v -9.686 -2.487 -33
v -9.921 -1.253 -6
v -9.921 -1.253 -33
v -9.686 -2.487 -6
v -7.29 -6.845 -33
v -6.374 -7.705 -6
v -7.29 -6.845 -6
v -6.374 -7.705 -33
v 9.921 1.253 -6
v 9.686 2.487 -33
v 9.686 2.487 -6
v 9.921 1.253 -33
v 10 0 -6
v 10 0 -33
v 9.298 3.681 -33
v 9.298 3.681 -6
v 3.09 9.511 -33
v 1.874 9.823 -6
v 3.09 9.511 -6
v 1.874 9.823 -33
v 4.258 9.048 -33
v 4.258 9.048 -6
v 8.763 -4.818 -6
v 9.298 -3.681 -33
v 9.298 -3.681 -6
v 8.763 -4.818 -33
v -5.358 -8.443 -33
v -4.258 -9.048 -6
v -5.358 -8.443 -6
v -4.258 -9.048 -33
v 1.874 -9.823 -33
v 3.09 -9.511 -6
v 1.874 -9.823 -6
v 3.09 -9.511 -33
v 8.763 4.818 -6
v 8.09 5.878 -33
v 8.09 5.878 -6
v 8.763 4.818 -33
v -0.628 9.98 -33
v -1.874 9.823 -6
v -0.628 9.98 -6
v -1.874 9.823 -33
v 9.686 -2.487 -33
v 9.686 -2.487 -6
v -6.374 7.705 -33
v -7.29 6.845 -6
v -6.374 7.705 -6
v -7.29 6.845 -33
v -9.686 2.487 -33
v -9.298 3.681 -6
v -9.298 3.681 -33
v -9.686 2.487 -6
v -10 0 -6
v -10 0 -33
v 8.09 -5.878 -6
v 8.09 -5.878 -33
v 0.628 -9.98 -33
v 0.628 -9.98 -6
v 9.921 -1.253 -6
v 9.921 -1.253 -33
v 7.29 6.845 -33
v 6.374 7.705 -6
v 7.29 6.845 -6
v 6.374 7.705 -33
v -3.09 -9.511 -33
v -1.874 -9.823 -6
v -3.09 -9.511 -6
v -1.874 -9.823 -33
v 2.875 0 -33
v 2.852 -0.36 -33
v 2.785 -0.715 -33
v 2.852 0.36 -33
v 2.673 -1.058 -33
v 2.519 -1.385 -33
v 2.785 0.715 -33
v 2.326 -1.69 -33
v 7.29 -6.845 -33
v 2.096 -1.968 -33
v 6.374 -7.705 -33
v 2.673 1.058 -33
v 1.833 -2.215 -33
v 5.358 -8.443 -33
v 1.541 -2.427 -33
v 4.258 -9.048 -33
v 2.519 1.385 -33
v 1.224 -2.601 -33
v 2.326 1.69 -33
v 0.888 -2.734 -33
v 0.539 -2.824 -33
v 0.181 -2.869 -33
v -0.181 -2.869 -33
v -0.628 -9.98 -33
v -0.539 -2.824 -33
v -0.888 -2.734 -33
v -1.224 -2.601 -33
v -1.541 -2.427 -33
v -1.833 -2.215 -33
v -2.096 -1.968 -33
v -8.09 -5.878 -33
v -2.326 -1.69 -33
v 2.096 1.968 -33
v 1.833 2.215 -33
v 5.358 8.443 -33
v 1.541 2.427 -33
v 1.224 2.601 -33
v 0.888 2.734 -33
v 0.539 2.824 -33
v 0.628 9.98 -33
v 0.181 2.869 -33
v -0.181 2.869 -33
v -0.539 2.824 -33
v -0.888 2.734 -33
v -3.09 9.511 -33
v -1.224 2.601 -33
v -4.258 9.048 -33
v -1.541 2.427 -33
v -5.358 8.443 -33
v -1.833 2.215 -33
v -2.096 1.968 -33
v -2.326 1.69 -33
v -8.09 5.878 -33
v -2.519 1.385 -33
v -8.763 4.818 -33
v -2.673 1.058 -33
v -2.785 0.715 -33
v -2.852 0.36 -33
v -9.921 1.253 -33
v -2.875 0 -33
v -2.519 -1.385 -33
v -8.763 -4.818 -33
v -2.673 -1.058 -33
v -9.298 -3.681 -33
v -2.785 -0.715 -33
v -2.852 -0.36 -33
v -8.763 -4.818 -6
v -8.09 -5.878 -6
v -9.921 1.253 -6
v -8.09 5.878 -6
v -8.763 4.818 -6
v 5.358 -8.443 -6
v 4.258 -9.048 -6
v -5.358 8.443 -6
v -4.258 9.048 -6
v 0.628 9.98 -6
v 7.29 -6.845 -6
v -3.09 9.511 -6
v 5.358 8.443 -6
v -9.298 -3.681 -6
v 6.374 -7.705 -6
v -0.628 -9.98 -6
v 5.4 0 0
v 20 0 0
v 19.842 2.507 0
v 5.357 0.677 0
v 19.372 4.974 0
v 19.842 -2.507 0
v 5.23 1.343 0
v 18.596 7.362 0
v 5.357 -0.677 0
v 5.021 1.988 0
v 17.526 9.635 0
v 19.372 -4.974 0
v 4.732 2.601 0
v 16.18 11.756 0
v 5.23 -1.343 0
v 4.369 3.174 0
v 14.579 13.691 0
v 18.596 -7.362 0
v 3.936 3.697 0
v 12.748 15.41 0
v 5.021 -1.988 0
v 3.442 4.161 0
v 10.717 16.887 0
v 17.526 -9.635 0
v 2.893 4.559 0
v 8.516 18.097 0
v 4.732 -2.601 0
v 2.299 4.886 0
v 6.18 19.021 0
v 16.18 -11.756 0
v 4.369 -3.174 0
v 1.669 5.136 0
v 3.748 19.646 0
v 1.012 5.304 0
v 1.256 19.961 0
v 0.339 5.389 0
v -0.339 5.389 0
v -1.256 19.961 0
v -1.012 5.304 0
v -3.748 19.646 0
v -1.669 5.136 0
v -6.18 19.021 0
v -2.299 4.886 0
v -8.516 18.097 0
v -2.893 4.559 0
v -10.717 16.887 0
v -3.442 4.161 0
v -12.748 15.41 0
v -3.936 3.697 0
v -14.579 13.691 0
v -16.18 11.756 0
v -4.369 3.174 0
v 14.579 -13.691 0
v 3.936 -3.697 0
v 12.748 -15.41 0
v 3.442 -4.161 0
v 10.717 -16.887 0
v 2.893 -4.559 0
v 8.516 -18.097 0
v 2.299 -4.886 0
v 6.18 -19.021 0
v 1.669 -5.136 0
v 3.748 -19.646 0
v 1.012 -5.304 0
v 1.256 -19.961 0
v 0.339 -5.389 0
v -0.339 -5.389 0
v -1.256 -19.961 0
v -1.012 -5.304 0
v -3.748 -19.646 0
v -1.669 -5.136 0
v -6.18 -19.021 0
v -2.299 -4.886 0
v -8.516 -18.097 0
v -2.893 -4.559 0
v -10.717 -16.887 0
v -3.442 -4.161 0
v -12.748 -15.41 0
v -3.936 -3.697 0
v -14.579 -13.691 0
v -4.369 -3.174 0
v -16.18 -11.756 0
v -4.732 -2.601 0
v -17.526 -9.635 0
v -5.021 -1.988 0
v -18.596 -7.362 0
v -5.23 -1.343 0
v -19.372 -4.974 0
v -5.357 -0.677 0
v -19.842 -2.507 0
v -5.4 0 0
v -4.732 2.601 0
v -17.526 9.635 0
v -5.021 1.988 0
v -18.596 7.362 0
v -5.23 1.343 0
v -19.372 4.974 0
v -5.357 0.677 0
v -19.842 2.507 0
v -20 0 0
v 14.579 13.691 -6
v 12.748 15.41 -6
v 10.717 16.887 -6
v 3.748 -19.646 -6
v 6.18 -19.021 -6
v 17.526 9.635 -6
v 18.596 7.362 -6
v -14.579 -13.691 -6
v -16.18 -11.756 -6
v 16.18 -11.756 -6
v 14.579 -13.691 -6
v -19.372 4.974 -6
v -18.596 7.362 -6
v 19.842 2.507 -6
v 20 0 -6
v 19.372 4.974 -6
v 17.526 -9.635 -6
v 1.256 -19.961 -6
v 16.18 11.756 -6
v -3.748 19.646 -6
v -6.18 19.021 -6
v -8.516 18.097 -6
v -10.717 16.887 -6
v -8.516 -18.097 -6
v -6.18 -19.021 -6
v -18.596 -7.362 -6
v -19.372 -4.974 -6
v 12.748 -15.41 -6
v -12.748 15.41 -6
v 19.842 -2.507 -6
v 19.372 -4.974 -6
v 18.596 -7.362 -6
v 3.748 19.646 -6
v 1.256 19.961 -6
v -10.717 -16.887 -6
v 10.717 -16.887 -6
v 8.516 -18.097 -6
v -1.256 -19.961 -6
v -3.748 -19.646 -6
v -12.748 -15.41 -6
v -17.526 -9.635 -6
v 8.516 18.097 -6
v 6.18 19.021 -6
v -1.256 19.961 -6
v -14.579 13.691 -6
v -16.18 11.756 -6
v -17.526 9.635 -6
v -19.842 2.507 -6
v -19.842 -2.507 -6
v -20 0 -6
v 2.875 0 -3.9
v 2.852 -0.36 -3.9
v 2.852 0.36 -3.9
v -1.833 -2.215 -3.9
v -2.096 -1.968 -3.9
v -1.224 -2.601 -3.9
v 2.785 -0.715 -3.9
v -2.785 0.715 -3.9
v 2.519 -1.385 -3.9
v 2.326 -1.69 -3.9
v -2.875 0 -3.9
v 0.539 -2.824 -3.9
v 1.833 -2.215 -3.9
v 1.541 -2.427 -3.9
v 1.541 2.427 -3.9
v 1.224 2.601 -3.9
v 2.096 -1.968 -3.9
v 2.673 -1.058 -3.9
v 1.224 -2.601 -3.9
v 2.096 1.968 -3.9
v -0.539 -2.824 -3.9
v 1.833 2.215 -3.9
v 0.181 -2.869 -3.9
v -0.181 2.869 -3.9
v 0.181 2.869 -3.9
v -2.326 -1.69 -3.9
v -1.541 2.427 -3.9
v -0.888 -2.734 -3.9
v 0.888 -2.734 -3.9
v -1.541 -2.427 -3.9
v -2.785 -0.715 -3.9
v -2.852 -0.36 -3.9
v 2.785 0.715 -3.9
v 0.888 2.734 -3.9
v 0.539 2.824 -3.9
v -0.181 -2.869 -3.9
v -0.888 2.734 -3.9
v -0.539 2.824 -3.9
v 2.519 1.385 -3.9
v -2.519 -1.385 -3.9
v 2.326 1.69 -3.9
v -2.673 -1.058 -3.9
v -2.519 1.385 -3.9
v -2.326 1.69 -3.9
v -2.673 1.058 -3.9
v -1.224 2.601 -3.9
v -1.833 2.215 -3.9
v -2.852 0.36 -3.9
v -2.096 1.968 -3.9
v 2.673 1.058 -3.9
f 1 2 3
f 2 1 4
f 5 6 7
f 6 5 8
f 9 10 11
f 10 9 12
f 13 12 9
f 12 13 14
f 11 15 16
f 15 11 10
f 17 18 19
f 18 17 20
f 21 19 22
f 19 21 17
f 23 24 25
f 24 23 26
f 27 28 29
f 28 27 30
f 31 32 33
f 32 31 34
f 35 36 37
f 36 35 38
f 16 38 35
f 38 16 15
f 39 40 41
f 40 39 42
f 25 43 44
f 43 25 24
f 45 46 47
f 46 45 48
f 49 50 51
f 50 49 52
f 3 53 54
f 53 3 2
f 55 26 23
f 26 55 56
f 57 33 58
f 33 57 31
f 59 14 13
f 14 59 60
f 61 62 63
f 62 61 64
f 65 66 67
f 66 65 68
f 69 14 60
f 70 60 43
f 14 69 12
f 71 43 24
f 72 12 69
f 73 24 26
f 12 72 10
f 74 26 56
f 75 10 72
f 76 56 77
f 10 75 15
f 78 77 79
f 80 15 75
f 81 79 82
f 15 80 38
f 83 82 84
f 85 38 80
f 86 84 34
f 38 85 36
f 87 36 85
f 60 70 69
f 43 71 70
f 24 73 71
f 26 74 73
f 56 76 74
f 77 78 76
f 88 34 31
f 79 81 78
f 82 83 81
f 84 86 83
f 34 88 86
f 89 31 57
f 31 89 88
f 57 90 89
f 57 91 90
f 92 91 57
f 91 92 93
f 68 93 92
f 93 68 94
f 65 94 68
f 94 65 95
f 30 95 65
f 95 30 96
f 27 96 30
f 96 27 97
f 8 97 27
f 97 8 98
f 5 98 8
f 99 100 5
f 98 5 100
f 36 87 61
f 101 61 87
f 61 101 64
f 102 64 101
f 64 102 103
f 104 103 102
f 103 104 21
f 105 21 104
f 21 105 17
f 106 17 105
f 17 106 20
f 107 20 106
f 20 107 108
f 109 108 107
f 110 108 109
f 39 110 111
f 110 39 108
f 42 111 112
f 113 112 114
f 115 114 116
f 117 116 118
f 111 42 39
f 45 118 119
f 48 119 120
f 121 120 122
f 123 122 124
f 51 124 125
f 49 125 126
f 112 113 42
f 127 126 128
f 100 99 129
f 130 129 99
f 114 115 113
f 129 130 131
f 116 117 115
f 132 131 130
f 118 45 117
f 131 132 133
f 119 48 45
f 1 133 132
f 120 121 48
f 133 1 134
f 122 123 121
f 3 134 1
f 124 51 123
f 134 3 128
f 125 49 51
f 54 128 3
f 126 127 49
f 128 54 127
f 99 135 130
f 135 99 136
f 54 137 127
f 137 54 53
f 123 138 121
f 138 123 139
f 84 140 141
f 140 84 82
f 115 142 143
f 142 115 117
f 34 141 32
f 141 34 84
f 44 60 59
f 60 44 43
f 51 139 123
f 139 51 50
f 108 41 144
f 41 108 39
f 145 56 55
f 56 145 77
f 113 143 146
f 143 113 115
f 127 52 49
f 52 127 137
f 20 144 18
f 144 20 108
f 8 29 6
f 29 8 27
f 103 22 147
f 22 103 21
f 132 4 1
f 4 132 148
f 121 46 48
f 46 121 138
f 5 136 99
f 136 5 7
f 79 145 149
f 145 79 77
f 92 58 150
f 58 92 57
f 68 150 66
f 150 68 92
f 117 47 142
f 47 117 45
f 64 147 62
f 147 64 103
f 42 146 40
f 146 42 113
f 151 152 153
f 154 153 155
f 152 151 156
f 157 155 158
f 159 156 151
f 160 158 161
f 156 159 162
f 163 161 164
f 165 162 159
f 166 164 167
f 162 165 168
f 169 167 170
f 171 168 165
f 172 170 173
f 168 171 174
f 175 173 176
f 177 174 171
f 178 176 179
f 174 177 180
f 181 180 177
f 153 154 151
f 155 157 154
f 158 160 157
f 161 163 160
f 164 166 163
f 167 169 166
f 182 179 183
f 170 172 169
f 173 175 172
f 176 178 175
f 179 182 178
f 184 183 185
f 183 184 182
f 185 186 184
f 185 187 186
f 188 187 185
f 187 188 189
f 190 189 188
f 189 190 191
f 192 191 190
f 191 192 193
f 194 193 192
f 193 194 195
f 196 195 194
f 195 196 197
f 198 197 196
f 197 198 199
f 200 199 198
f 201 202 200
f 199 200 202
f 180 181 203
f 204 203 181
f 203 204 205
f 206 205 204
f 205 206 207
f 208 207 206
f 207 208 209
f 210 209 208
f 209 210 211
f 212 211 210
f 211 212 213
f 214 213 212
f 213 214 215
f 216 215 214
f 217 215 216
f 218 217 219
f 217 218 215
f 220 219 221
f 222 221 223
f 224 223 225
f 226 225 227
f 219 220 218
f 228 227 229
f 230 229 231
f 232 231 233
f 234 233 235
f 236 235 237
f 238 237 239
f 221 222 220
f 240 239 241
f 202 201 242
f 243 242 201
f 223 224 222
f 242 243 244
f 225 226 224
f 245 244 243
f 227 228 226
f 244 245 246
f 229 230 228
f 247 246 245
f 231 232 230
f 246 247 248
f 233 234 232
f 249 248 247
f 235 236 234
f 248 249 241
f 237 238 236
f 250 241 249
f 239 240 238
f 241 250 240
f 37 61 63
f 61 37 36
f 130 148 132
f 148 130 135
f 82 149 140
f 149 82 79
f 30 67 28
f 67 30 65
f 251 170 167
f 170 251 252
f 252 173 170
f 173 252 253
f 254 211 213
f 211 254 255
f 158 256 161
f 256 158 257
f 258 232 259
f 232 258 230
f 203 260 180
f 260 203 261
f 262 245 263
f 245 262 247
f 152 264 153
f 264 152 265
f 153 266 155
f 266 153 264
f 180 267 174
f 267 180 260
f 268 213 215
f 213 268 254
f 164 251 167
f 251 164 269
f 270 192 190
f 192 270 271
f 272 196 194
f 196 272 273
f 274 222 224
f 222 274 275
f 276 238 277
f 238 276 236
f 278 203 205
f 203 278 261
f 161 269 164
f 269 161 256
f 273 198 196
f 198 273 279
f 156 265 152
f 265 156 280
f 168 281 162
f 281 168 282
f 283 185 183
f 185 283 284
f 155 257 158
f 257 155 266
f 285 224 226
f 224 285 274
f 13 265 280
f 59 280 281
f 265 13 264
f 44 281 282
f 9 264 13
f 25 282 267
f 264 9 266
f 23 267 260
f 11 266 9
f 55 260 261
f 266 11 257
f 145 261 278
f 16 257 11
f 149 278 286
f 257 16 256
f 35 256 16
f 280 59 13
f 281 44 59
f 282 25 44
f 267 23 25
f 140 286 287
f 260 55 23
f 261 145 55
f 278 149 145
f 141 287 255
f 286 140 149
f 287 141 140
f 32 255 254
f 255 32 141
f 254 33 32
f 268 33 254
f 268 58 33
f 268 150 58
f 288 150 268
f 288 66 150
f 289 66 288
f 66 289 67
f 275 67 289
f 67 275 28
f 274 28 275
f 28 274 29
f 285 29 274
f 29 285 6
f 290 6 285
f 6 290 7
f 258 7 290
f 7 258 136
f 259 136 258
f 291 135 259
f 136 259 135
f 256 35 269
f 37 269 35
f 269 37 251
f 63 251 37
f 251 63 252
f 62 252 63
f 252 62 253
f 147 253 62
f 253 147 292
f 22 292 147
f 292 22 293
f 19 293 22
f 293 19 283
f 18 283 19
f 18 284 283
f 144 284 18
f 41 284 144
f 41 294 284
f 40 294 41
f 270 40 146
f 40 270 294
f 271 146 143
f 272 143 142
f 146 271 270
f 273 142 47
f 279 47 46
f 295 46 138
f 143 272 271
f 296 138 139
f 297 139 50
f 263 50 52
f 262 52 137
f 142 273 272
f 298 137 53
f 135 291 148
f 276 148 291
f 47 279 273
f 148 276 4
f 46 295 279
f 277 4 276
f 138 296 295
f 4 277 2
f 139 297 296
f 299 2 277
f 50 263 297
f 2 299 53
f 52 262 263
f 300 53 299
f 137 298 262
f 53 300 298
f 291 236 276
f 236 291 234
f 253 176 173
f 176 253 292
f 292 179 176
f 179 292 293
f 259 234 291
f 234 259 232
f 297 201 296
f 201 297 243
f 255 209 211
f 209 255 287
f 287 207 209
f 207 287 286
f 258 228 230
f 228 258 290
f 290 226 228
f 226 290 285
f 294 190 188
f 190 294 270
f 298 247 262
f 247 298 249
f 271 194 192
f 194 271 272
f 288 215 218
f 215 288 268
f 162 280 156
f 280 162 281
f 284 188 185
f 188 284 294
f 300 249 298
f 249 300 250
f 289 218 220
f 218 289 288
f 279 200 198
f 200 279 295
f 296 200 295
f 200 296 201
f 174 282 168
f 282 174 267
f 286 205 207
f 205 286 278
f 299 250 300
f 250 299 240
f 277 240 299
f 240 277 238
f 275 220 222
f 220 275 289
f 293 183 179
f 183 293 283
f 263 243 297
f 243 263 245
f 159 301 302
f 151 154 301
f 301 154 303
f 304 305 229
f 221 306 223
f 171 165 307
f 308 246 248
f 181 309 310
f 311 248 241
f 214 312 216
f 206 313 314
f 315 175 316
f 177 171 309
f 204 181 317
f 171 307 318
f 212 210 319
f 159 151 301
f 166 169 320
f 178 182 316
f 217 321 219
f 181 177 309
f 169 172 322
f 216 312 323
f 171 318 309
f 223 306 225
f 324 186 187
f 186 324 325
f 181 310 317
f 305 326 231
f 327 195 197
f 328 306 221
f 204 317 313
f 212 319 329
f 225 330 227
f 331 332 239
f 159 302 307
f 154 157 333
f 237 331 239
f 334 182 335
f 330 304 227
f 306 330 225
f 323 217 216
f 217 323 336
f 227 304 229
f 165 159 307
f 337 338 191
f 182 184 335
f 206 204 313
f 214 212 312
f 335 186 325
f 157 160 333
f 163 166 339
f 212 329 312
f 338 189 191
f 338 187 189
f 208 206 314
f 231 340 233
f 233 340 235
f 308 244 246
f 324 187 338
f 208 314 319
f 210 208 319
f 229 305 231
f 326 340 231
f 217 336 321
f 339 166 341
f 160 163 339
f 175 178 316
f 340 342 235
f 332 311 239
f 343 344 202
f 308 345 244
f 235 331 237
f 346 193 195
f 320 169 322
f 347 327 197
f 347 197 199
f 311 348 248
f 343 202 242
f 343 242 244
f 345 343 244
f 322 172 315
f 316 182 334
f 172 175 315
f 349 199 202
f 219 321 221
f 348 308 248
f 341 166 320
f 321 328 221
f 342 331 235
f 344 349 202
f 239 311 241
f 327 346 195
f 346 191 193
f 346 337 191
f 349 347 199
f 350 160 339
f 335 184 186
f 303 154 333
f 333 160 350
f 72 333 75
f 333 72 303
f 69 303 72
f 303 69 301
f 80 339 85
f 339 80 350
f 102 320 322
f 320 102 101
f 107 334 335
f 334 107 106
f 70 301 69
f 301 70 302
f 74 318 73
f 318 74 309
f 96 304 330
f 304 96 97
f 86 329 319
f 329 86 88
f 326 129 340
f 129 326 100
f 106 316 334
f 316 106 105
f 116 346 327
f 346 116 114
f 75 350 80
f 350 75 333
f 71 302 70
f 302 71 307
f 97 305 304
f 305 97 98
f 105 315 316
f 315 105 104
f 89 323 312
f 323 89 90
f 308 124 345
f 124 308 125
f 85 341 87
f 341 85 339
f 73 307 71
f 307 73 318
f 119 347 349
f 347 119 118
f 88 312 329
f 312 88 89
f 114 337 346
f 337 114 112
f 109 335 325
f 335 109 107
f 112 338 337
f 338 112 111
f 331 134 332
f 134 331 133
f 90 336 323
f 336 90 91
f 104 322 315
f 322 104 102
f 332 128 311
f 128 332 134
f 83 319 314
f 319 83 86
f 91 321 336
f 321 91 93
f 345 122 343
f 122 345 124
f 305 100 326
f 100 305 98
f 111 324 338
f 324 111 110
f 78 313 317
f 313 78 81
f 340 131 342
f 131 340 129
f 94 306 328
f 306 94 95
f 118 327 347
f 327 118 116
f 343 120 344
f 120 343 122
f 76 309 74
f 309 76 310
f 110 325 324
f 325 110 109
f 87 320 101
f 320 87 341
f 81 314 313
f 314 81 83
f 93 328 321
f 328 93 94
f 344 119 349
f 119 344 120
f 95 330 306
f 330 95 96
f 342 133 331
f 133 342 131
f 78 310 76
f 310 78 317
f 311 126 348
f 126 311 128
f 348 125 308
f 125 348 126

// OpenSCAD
$fn = 50;


difference() {
	union() {
		translate(v = [0, 0, -33.0000000000]) {
			cylinder(h = 33, r = 10.0000000000);
		}
		translate(v = [0, 0, -6.0000000000]) {
			cylinder(h = 6, r = 20.0000000000);
		}
	}
	union() {
		translate(v = [0, 0, 0]) {
			rotate(a = [0, 0, 0]) {
				difference() {
					union() {
						#translate(v = [0, 0, -33.0000000000]) {
							cylinder(h = 33, r = 2.6000000000);
						}
						#translate(v = [0, 0, -3.9000000000]) {
							cylinder(h = 3.9000000000, r1 = 2.8750000000, r2 = 5.4000000000);
						}
						#translate(v = [0, 0, -33.0000000000]) {
							cylinder(h = 33, r = 2.8750000000);
						}
						#translate(v = [0, 0, -33.0000000000]) {
							cylinder(h = 33, r = 2.6000000000);
						}
					}
					union();
				}
			}
		}
	}
}
